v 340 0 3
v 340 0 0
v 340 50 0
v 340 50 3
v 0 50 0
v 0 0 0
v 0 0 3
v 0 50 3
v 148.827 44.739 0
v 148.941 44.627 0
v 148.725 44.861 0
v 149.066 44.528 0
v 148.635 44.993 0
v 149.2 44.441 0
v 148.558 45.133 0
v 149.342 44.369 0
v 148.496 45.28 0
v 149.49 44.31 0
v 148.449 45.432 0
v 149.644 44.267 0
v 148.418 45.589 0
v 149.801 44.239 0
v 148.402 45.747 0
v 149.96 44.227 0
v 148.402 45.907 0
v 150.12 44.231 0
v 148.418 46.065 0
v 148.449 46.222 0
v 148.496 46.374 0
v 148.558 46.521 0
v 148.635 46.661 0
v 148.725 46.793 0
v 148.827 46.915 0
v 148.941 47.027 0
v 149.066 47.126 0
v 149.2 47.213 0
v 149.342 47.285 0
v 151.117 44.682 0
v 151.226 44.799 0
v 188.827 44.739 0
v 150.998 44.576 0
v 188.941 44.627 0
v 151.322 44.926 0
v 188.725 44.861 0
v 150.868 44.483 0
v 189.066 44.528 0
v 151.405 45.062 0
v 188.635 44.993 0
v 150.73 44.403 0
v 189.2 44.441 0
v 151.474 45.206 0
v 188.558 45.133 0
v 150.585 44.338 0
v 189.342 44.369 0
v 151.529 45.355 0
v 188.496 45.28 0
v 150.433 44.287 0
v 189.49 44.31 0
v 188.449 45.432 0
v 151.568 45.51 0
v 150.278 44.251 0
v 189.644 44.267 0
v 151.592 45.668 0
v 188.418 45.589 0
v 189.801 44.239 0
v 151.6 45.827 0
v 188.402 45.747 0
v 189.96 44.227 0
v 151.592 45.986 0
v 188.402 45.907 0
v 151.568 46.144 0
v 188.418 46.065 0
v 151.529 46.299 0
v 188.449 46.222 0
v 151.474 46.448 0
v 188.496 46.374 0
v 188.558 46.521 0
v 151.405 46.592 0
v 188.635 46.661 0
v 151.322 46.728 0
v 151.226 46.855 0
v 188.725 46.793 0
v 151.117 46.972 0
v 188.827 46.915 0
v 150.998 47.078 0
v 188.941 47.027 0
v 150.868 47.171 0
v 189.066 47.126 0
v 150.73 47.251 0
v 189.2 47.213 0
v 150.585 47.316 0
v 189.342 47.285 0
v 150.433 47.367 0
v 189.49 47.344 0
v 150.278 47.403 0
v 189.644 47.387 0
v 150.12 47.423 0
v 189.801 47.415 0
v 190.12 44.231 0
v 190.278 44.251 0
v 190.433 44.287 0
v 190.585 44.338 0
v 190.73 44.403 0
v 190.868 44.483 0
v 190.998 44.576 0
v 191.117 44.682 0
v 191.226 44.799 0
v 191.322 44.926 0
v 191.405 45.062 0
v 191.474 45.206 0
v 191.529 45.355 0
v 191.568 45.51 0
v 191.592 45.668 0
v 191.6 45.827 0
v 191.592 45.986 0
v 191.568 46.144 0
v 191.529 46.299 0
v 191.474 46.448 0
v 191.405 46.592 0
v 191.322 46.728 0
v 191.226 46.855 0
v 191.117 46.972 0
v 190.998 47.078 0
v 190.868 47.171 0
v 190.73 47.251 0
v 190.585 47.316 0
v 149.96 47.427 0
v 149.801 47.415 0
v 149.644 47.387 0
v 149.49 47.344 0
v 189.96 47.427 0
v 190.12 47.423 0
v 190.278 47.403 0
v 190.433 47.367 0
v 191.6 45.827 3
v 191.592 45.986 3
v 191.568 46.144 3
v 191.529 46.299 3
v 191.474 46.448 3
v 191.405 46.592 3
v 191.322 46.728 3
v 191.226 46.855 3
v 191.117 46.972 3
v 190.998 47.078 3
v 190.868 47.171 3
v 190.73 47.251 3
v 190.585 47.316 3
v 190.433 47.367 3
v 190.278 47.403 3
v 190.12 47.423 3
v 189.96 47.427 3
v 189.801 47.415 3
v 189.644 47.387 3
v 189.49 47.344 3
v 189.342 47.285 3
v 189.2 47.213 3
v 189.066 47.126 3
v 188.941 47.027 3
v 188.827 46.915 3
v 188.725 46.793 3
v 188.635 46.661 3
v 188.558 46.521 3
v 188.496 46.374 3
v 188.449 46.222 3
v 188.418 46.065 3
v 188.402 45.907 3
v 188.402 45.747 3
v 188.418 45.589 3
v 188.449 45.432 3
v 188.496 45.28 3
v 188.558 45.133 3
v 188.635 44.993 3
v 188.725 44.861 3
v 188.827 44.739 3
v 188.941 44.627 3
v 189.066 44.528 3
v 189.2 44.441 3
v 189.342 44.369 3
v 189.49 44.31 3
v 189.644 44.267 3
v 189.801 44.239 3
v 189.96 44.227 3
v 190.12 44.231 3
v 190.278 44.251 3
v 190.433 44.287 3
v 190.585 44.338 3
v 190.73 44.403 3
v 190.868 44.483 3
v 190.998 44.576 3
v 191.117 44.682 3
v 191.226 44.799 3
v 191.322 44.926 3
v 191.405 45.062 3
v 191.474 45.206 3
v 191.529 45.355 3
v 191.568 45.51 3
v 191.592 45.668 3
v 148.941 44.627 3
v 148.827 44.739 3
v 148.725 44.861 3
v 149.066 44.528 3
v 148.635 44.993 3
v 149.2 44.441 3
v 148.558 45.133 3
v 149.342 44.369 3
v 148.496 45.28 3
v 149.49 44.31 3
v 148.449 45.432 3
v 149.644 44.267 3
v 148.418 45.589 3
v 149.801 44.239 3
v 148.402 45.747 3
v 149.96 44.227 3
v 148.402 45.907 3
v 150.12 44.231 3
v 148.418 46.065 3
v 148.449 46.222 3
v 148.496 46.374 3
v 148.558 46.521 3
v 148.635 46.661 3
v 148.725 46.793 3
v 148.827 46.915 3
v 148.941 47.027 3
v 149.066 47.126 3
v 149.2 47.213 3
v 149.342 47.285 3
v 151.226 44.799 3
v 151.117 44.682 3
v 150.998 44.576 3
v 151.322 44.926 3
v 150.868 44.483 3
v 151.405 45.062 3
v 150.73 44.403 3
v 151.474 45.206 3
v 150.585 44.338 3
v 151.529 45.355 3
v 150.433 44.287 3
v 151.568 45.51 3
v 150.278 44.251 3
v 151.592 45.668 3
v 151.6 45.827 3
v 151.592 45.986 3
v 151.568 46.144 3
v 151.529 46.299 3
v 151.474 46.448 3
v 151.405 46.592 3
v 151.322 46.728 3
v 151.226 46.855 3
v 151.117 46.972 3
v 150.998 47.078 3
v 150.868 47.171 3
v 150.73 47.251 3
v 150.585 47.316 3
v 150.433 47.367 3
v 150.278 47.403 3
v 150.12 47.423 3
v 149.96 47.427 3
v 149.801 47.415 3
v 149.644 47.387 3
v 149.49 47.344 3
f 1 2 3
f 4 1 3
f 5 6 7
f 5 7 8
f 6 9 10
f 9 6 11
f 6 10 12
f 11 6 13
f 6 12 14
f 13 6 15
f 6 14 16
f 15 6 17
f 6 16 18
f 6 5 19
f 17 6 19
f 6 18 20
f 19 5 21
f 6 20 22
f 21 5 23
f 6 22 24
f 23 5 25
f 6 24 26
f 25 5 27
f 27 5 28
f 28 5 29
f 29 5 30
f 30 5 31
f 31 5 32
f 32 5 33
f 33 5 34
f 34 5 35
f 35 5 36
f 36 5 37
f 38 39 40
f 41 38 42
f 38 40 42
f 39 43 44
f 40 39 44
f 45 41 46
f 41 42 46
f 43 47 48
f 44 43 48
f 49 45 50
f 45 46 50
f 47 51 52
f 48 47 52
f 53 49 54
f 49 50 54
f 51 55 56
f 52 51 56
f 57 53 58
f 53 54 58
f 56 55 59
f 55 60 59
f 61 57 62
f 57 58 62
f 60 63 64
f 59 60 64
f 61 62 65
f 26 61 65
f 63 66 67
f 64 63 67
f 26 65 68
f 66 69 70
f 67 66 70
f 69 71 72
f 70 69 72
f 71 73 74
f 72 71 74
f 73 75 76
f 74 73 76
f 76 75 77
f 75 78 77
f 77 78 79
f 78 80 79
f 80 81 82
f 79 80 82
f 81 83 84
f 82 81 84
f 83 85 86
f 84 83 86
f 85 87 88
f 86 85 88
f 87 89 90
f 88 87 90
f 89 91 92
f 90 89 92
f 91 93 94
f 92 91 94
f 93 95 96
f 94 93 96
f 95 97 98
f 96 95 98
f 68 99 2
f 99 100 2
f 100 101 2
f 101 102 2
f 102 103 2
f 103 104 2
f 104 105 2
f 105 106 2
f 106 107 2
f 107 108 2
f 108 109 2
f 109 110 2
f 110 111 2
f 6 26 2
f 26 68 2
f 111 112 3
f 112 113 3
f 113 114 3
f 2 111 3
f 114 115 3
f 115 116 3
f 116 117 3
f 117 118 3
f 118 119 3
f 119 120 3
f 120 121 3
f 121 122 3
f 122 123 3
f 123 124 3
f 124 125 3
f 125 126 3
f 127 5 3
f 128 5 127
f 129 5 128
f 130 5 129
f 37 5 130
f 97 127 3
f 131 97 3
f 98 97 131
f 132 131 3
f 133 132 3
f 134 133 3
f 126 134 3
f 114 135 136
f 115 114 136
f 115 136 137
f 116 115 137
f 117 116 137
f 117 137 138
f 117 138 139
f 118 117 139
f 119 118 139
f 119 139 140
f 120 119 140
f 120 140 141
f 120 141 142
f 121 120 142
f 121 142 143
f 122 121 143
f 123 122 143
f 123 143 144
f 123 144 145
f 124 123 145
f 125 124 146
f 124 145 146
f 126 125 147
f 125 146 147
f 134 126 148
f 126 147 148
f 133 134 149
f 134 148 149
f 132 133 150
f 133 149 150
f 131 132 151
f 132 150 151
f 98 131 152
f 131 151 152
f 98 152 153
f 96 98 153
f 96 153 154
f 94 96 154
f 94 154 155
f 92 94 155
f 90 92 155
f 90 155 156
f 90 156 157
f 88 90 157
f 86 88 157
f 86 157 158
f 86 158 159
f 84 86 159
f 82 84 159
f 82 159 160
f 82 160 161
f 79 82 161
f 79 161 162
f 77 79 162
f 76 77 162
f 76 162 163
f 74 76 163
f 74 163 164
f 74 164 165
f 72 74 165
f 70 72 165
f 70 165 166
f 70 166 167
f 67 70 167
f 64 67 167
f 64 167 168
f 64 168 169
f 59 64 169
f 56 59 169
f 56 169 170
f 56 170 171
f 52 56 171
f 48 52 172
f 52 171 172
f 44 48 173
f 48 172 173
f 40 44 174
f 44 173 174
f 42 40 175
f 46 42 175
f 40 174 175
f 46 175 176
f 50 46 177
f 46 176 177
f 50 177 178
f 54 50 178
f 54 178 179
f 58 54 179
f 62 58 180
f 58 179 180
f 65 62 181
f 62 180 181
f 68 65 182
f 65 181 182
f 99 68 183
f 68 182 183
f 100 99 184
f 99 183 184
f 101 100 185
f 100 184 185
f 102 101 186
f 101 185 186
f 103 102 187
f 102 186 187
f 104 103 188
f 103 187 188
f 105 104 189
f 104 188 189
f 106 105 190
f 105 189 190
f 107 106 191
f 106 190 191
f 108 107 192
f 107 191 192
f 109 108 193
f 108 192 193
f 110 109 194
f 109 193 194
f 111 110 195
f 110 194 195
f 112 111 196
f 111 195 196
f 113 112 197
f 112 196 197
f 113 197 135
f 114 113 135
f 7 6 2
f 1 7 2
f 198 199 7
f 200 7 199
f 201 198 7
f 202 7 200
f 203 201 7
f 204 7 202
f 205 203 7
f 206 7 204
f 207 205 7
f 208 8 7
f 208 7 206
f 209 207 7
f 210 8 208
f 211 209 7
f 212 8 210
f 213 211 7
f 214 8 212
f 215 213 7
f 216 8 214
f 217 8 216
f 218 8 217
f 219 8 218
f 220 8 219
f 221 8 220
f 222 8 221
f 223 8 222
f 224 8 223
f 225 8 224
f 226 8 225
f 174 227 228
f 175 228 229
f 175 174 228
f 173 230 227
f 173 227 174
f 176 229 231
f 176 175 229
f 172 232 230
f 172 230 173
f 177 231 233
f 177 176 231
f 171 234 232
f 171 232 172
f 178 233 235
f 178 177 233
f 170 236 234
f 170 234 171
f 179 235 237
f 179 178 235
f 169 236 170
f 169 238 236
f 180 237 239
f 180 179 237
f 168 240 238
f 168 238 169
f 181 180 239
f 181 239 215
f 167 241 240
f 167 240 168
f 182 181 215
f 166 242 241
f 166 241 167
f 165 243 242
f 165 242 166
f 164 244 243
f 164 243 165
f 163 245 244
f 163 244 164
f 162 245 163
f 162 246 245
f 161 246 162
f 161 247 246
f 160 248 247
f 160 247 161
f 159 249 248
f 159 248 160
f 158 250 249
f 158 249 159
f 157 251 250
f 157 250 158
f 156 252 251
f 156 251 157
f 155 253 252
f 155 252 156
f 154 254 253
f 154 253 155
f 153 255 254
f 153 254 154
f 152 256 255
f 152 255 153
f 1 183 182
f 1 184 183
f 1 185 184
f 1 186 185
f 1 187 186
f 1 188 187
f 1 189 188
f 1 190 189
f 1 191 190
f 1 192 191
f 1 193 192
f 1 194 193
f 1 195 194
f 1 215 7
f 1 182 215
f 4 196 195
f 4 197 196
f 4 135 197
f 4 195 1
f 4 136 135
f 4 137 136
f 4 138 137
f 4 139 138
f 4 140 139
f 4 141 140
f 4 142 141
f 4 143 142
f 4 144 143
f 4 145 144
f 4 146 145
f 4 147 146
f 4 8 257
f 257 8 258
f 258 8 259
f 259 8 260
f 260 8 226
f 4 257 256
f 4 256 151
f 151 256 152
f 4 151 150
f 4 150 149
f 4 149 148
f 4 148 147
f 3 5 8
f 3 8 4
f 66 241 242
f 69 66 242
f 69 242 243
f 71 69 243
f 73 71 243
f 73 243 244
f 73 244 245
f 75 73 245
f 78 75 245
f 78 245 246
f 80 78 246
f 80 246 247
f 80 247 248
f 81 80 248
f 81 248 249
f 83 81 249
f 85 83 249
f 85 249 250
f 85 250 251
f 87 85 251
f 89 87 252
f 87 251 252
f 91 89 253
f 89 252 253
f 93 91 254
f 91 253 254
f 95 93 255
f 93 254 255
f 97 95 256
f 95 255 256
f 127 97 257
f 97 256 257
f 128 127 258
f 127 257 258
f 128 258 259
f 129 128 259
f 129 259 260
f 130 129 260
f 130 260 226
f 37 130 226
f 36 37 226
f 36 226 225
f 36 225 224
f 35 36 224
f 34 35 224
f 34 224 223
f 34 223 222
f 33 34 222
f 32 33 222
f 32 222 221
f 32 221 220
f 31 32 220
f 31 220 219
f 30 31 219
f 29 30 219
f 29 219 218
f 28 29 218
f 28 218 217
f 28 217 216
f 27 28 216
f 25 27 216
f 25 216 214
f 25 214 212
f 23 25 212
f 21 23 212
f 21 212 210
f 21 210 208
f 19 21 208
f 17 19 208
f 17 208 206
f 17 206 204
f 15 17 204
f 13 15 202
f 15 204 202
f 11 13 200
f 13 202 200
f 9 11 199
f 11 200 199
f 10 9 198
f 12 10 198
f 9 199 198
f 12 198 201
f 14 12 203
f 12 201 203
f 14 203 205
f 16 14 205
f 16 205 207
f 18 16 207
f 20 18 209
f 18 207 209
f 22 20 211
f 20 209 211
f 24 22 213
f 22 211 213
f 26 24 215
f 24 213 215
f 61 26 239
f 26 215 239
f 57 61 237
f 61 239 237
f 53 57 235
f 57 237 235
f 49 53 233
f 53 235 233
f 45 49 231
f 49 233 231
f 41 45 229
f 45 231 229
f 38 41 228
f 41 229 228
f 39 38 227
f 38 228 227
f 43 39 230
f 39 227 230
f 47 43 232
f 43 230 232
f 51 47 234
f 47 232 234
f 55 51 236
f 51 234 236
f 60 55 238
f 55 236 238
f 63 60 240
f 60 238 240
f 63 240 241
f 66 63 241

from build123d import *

# Parameters (mm, degrees)
SKETCH1_W           = 340
SKETCH1_H           = 50
BOSS_EXTRUDE1_DEPTH = 3
CUT_EXTRUDE1_REACH  = 345.67
SKETCH2_R           = 1.6


with BuildPart() as part:
    # Sketch1 → Boss-Extrude1 (new body)
    with BuildSketch(Plane.XY):
        with Locations((170, 25)):
            Rectangle(SKETCH1_W, SKETCH1_H)
    extrude(amount=BOSS_EXTRUDE1_DEPTH)

    # Sketch2 → Cut-Extrude1 (cut, up to next)
    with BuildSketch(Plane.XY.offset(3), mode=Mode.PRIVATE) as cut_extrude1_sk1:
        with Locations((150, 45.82699859)):
            Circle(SKETCH2_R)
    cut_extrude1_tool1 = extrude(cut_extrude1_sk1.sketch, amount=-CUT_EXTRUDE1_REACH, mode=Mode.PRIVATE) & part.part
    # Sketch2 → Cut-Extrude1 (cut, up to next)
    with BuildSketch(Plane.XY.offset(3), mode=Mode.PRIVATE) as cut_extrude1_sk2:
        with Locations((190, 45.82699859)):
            Circle(SKETCH2_R)
    cut_extrude1_tool2 = extrude(cut_extrude1_sk2.sketch, amount=-CUT_EXTRUDE1_REACH, mode=Mode.PRIVATE) & part.part
    add(cut_extrude1_tool1.solids().sort_by_distance((150, 45.826999, 3))[0], mode=Mode.SUBTRACT)
    add(cut_extrude1_tool2.solids().sort_by_distance((190, 45.826999, 3))[0], mode=Mode.SUBTRACT)


solid = part.part
